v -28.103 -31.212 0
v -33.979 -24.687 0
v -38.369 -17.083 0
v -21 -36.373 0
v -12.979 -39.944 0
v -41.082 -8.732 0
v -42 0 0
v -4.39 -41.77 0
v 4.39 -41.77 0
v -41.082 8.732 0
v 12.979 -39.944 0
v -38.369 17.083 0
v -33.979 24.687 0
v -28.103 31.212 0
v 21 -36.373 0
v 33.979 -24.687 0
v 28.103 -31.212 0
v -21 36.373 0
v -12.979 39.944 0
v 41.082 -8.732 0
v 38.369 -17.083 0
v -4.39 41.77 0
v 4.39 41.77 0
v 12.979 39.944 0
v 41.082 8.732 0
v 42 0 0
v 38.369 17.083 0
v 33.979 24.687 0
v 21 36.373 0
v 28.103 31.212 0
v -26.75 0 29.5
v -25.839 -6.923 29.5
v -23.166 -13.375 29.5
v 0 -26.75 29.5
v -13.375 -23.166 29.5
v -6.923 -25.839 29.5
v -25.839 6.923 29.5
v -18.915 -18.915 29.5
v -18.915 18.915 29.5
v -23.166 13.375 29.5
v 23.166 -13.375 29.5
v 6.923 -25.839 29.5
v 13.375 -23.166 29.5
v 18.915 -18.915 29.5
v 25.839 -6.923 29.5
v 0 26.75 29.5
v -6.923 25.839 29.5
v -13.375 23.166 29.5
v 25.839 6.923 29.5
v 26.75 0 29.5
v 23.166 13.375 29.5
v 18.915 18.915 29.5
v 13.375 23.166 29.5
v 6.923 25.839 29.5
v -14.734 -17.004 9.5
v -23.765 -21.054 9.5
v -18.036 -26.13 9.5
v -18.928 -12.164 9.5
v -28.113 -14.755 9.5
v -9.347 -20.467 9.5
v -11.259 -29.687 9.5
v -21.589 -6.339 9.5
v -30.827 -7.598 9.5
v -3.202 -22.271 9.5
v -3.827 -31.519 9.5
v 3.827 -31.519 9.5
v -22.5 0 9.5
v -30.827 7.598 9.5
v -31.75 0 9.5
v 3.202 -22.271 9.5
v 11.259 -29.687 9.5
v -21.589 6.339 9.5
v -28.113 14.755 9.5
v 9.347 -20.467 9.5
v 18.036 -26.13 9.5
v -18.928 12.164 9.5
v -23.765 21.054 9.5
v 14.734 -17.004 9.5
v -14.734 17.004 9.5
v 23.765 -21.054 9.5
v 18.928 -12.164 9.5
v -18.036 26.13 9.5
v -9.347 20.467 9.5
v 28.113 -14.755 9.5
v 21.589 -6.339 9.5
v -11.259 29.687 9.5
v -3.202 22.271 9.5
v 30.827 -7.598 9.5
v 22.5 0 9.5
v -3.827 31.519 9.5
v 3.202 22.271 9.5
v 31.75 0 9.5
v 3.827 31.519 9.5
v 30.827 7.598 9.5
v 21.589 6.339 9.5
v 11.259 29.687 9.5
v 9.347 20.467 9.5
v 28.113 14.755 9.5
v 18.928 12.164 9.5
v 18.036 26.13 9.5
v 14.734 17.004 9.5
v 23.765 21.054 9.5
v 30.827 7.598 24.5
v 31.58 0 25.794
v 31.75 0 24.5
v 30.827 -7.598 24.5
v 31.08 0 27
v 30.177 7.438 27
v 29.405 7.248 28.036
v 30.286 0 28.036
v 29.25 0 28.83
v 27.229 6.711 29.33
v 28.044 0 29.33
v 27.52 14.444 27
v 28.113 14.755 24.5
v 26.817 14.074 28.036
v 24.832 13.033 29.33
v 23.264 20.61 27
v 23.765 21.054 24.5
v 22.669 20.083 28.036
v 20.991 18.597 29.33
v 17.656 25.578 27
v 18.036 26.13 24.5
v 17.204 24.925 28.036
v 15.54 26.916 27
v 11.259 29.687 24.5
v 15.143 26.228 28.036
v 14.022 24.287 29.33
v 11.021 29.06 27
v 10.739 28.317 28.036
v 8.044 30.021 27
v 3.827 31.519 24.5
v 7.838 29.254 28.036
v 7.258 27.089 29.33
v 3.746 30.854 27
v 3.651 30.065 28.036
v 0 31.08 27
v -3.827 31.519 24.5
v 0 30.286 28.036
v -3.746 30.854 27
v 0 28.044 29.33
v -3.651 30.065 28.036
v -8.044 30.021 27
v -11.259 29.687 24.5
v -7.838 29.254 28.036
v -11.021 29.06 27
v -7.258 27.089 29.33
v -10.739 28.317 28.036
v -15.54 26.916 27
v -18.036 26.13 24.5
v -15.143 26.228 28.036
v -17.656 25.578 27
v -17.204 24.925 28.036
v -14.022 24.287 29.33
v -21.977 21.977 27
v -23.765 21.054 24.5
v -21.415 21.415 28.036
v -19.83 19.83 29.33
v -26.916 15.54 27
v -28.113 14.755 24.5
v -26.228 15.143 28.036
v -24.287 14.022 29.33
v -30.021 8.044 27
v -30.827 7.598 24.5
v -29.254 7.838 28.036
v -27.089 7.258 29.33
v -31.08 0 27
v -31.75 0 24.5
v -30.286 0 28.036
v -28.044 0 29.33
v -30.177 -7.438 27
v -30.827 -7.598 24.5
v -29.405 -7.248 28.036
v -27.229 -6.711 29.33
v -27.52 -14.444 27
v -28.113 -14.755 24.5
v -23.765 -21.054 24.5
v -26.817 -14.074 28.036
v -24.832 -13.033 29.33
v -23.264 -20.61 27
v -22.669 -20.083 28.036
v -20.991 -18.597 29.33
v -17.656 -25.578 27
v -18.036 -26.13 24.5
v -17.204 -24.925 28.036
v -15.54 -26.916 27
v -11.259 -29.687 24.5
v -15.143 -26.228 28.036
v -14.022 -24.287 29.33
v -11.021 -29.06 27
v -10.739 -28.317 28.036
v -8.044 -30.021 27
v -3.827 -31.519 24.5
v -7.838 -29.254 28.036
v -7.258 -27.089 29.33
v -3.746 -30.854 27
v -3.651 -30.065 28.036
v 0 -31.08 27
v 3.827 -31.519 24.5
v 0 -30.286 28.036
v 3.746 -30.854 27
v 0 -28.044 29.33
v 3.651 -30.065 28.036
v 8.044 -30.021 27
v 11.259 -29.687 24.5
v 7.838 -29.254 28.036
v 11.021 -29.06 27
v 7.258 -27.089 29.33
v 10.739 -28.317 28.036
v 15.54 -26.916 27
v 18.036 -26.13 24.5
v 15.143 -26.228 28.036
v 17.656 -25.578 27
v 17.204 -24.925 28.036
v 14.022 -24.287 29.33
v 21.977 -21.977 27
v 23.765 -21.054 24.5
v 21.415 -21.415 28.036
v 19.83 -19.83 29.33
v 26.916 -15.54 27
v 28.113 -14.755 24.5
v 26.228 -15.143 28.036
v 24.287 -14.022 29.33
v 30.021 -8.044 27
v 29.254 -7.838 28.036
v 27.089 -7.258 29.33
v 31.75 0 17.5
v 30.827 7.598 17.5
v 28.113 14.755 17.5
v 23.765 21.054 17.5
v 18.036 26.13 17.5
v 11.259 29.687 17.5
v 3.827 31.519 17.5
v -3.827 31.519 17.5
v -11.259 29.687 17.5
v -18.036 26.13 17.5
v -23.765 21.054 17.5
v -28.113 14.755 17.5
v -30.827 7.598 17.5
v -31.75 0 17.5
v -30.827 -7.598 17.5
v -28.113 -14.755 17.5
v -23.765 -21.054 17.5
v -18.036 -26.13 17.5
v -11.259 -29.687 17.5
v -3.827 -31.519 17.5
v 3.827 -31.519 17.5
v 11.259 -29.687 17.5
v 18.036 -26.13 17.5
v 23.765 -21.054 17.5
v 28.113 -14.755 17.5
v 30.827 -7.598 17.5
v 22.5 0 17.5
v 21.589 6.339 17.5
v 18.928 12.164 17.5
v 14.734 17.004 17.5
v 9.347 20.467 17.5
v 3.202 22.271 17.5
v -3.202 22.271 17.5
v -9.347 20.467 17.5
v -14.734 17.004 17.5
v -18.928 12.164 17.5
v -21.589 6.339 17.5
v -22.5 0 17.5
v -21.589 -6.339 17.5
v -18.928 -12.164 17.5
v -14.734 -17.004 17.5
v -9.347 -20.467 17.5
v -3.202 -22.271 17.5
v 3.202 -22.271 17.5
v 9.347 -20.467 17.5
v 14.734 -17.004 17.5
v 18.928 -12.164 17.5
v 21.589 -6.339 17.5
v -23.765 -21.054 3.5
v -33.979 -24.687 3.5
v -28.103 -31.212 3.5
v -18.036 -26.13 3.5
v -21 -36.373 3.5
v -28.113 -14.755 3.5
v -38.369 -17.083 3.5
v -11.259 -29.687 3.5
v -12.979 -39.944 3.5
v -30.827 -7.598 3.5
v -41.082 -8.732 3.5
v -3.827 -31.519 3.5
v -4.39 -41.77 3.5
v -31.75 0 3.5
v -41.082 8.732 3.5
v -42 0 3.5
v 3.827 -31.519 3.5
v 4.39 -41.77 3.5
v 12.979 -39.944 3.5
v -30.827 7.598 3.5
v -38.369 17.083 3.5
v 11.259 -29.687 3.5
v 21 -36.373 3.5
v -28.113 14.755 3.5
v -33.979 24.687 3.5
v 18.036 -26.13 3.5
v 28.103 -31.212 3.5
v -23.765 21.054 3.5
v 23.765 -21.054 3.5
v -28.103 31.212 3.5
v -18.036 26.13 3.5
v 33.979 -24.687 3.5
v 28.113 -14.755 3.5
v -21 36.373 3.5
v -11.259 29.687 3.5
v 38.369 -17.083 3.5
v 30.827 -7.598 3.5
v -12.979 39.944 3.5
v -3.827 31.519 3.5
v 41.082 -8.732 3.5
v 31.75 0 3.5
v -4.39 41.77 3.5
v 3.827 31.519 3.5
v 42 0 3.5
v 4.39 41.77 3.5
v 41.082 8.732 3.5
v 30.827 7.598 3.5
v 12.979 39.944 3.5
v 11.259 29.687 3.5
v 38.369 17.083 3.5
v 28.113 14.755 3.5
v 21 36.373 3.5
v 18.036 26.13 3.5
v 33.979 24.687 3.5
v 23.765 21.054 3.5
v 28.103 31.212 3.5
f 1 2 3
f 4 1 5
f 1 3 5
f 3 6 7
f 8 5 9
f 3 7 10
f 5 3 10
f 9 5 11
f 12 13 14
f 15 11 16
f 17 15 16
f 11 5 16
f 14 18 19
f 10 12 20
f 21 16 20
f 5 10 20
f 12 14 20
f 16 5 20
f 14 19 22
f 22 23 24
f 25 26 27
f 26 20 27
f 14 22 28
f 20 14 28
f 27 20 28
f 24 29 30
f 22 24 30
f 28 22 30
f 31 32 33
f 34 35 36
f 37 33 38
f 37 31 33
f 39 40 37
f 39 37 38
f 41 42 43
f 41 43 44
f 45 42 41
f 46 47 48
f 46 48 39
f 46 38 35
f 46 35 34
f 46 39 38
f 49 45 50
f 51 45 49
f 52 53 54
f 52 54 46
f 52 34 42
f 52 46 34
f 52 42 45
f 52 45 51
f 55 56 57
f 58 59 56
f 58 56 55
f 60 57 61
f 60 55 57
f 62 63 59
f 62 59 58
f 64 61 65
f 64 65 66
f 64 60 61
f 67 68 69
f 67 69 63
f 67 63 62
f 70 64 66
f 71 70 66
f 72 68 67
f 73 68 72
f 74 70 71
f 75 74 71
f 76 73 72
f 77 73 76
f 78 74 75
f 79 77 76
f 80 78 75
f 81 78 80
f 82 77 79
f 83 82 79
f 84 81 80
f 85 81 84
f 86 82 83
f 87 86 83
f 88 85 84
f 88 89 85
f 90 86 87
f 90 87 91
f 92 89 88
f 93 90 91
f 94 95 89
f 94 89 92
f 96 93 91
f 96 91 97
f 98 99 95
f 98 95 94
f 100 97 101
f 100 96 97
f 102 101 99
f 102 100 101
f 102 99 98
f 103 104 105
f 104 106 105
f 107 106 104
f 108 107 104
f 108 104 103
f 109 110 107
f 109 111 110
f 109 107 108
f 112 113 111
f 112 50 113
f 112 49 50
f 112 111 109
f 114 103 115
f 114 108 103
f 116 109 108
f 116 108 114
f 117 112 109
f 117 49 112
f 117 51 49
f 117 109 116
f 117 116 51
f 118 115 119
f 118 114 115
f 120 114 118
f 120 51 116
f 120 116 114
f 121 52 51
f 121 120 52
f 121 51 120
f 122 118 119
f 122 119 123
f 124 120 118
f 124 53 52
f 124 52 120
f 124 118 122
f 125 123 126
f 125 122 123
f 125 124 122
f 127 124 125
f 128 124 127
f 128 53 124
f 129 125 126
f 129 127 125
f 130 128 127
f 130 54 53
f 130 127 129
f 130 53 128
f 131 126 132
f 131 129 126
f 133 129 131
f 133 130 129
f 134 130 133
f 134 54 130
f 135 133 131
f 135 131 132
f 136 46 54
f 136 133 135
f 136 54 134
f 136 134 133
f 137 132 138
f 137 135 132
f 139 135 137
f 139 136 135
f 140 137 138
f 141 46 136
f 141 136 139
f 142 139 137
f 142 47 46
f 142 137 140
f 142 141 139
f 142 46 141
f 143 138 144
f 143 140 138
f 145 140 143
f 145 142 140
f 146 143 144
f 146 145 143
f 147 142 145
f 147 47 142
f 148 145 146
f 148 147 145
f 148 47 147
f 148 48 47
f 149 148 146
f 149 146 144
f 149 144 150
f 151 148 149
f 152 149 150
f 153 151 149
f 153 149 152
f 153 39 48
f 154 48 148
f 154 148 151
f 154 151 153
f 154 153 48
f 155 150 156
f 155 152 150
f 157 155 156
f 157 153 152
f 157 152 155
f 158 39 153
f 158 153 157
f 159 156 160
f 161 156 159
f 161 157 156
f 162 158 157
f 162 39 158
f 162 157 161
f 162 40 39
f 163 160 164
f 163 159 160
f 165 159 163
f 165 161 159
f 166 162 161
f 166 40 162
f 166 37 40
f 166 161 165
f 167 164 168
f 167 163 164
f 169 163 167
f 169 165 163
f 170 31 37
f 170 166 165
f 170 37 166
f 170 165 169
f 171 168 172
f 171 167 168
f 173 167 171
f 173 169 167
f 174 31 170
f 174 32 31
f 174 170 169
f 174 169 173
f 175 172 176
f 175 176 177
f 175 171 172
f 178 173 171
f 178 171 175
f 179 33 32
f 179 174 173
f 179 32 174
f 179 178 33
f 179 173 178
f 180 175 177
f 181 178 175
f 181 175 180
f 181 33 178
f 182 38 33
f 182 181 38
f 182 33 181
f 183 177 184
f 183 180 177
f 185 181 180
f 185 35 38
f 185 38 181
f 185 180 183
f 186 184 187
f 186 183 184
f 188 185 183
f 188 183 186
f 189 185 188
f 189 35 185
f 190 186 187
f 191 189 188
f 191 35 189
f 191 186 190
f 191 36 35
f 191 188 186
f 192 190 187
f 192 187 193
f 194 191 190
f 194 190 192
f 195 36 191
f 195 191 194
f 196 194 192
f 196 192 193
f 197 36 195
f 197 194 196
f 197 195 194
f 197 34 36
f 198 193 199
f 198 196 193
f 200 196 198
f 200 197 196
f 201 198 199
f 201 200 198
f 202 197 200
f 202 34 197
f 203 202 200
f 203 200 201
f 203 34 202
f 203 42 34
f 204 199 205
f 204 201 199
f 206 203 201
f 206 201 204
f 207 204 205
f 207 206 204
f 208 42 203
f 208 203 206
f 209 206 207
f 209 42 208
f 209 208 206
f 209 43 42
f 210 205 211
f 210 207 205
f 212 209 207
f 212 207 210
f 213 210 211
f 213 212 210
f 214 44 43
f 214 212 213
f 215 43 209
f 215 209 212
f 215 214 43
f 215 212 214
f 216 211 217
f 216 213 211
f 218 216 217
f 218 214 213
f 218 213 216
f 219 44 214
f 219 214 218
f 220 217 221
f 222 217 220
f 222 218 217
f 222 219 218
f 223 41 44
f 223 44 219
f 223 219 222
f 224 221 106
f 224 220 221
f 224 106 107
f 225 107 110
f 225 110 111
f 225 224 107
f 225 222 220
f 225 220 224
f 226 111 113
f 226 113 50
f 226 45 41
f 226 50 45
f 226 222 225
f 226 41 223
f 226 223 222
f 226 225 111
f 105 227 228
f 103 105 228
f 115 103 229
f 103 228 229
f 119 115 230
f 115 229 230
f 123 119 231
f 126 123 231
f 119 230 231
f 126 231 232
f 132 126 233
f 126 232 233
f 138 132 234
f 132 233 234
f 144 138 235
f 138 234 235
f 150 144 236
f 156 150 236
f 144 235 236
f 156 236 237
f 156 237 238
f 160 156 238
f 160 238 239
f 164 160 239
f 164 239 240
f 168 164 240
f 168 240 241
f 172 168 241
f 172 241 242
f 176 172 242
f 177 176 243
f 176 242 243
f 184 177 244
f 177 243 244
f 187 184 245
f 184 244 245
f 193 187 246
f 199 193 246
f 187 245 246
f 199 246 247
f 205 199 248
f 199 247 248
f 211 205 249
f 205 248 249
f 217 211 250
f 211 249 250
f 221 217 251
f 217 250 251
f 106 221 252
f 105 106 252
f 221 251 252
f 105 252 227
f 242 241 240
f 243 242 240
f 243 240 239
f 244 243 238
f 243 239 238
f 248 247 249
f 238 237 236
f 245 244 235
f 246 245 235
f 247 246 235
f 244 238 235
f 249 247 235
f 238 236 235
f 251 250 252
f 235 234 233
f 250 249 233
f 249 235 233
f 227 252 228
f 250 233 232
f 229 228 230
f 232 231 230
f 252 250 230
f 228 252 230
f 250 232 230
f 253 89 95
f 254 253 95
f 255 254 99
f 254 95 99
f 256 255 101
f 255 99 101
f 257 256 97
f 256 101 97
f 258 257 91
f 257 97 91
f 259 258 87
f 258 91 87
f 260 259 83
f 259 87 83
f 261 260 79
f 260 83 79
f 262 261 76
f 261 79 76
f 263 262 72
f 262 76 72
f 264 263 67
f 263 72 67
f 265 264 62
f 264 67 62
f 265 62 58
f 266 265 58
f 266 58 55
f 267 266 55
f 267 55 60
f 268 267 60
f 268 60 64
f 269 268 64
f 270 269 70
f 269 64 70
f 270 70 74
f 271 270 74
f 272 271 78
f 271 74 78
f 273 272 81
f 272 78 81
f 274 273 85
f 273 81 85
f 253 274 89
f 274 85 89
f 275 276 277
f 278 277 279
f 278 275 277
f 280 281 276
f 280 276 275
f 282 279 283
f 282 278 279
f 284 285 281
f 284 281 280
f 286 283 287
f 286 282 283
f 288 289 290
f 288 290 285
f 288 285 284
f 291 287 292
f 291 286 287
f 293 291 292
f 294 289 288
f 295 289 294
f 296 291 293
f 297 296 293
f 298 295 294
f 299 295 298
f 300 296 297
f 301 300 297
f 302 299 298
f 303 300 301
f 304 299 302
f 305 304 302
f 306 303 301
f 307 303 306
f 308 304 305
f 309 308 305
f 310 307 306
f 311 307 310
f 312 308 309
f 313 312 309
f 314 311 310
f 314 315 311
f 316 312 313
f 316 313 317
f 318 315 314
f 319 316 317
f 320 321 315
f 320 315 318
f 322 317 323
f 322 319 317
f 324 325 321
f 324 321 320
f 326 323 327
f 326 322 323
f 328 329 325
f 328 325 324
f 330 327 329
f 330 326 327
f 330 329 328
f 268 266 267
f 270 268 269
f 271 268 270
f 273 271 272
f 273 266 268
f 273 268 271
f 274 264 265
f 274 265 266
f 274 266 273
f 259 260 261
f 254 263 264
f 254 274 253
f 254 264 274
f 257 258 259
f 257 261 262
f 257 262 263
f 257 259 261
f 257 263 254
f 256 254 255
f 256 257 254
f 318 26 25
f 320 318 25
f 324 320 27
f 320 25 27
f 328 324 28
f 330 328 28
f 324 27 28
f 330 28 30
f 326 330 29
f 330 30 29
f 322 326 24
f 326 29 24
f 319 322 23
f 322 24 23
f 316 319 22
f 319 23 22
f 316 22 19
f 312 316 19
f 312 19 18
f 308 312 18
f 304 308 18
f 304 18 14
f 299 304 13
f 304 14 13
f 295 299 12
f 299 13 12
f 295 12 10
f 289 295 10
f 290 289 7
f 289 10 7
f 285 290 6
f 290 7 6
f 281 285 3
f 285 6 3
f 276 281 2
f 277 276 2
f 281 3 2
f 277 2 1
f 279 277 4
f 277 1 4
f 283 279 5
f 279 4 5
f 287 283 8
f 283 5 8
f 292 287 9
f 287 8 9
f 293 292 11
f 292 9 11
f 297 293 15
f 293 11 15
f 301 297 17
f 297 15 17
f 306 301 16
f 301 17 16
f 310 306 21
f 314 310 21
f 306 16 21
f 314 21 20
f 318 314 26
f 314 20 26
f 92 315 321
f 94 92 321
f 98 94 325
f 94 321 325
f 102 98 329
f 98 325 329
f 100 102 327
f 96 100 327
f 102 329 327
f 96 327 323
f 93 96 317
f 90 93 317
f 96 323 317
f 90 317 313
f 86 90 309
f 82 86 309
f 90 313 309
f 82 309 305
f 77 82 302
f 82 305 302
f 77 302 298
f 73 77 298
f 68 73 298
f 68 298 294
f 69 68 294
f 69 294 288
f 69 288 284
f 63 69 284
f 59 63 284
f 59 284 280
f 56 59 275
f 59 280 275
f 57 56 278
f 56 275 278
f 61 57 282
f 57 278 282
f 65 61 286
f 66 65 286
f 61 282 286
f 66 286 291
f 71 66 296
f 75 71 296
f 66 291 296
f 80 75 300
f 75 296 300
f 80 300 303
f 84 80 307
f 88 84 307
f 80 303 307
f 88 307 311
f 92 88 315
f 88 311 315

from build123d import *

# Parameters (mm, degrees)
CROQUIS1_R              = 42
SALIENTE_EXTRUIR1_DEPTH = 3.5
CROQUIS2_R              = 31.75
SALIENTE_EXTRUIR2_DEPTH = 6
CROQUIS3_R              = 22.5
SALIENTE_EXTRUIR3_DEPTH = 8
CROQUIS4_R              = 31.75
SALIENTE_EXTRUIR4_DEPTH = 12
REDONDEO1_R             = 5


with BuildPart() as part:
    # Croquis1 → Saliente-Extruir1 (new body)
    with BuildSketch(Plane.XY):
        Circle(CROQUIS1_R)
    extrude(amount=SALIENTE_EXTRUIR1_DEPTH)

    # Croquis2 → Saliente-Extruir2 (add)
    with BuildSketch(Plane.XY.offset(3.5)):
        Circle(CROQUIS2_R)
    extrude(amount=SALIENTE_EXTRUIR2_DEPTH)

    # Croquis3 → Saliente-Extruir3 (add)
    with BuildSketch(Plane.XY.offset(9.5)):
        Circle(CROQUIS3_R)
    extrude(amount=SALIENTE_EXTRUIR3_DEPTH)


with BuildPart() as body_2:
    # Croquis4 → Saliente-Extruir4 (new body)
    with BuildSketch(Plane.XY.offset(17.5)):
        Circle(CROQUIS4_R)
    extrude(amount=SALIENTE_EXTRUIR4_DEPTH)

    # Redondeo1
    redondeo1_edges = [body_2.edges().sort_by_distance(p)[0] for p in [
        (-31.75, 0, 29.5),
    ]]
    fillet(redondeo1_edges, radius=REDONDEO1_R)


solid = Compound([part.part, body_2.part])
